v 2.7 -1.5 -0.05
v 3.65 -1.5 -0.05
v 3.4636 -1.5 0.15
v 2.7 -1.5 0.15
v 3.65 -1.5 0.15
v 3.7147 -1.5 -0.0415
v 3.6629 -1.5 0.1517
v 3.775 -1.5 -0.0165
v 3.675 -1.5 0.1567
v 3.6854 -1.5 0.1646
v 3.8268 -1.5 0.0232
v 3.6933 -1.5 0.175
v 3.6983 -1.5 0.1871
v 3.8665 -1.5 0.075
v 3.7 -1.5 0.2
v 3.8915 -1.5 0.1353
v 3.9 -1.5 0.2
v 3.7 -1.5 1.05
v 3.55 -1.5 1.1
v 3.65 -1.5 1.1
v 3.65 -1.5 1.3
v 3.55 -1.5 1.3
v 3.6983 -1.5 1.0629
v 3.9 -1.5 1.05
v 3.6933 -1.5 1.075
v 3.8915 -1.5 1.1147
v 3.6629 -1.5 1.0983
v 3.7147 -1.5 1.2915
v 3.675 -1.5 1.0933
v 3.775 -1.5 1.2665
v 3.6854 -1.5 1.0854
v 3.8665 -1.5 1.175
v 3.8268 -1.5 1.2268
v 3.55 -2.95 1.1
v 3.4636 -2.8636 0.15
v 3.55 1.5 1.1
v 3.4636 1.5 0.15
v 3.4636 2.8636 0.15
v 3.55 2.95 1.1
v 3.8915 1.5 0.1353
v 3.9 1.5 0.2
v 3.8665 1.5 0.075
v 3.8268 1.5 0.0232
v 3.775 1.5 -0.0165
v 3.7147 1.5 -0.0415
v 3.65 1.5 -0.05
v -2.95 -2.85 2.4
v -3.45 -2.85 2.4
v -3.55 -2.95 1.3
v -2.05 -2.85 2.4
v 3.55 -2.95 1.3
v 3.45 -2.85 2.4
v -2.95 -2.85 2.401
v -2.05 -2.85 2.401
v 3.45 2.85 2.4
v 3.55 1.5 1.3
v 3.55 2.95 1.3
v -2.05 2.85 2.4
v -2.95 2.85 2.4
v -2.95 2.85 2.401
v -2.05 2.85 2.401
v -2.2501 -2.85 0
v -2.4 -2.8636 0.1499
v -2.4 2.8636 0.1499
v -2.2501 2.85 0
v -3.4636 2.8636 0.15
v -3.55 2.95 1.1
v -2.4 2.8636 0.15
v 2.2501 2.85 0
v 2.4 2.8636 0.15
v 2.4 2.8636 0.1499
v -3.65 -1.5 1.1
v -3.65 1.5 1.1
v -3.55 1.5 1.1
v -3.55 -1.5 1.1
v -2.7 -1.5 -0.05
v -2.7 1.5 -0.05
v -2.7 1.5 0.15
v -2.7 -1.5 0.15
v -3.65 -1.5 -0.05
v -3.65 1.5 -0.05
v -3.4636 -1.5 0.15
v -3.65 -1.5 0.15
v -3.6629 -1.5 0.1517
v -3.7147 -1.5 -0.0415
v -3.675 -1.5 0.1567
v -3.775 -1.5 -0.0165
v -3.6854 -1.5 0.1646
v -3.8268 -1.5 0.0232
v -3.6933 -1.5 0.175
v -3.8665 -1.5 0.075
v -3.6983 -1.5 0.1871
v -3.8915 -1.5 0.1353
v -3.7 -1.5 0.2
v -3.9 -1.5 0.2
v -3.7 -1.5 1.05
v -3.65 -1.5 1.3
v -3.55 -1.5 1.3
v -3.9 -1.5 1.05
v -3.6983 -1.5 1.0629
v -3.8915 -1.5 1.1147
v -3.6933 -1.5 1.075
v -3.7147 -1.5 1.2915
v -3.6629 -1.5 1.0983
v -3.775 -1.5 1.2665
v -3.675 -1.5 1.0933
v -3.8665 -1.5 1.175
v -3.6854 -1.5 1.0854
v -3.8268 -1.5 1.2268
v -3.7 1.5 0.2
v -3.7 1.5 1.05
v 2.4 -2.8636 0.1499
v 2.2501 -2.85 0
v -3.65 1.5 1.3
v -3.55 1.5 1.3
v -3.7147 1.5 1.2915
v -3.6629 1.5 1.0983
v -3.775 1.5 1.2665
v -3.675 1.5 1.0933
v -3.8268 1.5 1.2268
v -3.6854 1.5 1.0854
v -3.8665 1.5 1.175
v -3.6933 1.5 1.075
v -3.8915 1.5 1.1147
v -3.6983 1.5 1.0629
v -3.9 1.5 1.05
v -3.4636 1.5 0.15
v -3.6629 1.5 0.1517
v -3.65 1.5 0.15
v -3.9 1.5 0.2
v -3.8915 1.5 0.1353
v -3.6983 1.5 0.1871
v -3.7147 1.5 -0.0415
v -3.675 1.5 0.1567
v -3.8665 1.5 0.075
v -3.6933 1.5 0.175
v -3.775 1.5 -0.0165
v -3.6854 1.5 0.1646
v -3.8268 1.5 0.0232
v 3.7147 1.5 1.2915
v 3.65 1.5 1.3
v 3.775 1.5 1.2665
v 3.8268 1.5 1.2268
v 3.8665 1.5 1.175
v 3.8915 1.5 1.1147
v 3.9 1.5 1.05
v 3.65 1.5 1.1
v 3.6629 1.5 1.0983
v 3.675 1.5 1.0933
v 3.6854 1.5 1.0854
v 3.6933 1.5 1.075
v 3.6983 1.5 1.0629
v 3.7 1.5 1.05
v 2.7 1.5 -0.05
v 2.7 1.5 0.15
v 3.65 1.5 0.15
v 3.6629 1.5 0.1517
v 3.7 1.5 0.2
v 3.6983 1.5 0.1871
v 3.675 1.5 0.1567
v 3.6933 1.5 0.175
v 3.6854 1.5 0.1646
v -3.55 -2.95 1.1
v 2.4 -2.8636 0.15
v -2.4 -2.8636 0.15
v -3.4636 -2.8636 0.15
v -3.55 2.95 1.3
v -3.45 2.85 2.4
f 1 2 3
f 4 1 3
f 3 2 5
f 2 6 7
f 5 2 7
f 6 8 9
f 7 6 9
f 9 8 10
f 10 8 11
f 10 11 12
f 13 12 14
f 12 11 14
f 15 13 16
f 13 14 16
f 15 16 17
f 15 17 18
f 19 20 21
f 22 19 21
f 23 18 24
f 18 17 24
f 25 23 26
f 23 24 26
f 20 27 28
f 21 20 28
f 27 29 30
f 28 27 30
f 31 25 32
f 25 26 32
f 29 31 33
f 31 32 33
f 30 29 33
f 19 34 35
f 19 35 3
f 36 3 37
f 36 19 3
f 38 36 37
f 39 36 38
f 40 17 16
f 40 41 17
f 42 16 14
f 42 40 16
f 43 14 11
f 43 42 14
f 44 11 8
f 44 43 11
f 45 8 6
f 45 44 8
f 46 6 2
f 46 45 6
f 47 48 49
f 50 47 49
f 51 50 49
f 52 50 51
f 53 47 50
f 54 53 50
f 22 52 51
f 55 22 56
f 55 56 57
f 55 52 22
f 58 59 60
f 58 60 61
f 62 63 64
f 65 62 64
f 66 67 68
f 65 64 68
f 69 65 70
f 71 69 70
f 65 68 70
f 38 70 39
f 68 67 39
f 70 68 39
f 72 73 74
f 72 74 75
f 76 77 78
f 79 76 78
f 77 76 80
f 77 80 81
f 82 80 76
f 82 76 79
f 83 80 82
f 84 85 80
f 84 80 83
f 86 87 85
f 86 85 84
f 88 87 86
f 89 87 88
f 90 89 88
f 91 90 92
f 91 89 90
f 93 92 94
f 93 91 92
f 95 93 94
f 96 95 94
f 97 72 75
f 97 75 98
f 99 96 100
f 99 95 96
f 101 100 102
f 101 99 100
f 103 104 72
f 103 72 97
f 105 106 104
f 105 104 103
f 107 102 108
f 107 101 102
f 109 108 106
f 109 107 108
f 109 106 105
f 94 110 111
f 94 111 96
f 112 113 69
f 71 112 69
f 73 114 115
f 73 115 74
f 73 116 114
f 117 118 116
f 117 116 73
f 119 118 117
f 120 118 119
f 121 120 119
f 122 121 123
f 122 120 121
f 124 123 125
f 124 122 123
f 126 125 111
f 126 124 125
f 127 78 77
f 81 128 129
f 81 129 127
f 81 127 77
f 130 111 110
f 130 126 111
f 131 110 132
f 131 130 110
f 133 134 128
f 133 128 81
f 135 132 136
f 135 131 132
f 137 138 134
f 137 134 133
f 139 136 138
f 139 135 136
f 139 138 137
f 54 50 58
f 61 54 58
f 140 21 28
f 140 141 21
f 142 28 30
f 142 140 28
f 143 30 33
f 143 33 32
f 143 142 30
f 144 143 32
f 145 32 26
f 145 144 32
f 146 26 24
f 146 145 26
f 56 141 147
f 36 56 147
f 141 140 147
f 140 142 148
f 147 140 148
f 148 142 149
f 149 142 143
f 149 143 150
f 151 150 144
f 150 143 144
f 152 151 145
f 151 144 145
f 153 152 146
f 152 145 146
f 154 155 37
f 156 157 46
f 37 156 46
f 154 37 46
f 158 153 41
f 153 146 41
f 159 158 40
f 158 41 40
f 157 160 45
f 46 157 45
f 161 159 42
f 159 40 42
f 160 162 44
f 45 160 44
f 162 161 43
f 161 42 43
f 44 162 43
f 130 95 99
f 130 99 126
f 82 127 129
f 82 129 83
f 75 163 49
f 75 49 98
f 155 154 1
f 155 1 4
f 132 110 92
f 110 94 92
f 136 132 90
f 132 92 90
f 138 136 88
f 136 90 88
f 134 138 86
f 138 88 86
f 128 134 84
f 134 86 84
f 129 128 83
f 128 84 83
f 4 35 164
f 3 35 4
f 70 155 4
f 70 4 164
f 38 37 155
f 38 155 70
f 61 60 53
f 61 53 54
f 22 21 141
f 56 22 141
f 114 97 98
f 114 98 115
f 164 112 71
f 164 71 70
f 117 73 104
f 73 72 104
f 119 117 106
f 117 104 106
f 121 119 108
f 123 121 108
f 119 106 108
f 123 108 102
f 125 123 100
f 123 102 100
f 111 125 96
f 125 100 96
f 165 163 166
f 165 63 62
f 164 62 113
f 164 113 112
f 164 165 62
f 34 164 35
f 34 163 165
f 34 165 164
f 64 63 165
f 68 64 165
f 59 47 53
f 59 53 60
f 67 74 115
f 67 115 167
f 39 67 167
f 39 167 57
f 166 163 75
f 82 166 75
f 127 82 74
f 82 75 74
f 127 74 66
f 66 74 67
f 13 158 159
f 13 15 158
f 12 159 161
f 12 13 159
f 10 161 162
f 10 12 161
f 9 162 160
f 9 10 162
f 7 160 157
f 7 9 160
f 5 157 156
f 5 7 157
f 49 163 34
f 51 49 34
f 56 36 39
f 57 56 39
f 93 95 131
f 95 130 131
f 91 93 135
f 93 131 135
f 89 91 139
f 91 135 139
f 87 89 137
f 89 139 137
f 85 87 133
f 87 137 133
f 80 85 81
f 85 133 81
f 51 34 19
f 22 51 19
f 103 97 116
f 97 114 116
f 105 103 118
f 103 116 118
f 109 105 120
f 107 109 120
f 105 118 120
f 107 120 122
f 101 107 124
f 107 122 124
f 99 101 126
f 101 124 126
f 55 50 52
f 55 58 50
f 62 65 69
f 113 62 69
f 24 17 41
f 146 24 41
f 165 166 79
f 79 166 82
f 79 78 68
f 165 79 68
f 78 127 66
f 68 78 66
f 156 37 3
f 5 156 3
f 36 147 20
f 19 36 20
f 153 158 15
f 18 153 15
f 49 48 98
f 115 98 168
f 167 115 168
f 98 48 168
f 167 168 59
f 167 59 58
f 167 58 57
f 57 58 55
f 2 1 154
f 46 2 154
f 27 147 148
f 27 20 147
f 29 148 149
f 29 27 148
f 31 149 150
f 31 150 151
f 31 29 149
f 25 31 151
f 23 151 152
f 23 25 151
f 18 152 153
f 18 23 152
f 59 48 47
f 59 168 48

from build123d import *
from OCP.BRepFilletAPI import BRepFilletAPI_MakeChamfer

# Parameters (mm, degrees)
SZKIC1_W                    = 7.1
SZKIC1_H                    = 5.9
DODANIE_WYCI_GNI_CIE1_DEPTH = 2.4
SFAZOWANIE1_SIZE            = 1.1
SFAZOWANIE1_SIZE2           = 0.1
SFAZOWANIE2_SIZE            = 0.1
SFAZOWANIE2_SIZE2           = 1.1
SZKIC2_W                    = 0.9
SZKIC2_H                    = 5.7
DODANIE_WYCI_GNI_CIE2_DEPTH = 0.001
SZKIC3_W                    = 0.15
SZKIC3_H                    = 5.9
WYTNIJ_WYCI_GNI_CIE1_DEPTH  = 1.15
SFAZOWANIE3_SIZE            = 0.15
SZKIC4_W                    = 0.2
SZKIC4_H                    = 3
SFAZOWANIE3_OF_LUSTRO1_SIZE = 0.15


with BuildPart() as part:
    # Szkic1 → Dodanie-wyciągnięcie1 (new body)
    with BuildSketch(Plane.XY):
        Rectangle(SZKIC1_W, SZKIC1_H)
    extrude(amount=DODANIE_WYCI_GNI_CIE1_DEPTH)

    # Sfazowanie1: one chamfer whose edges measure the first distance from different faces: ONE call of the kernel's chamfer builder (chamfer() names one face for all edges)
    sfazowanie1_edges_1 = [part.edges().sort_by_distance(p)[0] for p in [
        (3.55, 0, 2.4),
    ]]
    sfazowanie1_side_1 = [part.faces().sort_by_distance(p)[0] for p in [
        (3.55, 0, 1.2),
    ]]
    sfazowanie1_edges_2 = [part.edges().sort_by_distance(p)[0] for p in [
        (0, 2.95, 2.4),
    ]]
    sfazowanie1_side_2 = [part.faces().sort_by_distance(p)[0] for p in [
        (0, 2.95, 1.2),
    ]]
    sfazowanie1_edges_3 = [part.edges().sort_by_distance(p)[0] for p in [
        (-3.55, 0, 2.4),
    ]]
    sfazowanie1_side_3 = [part.faces().sort_by_distance(p)[0] for p in [
        (-3.55, 0, 1.2),
    ]]
    sfazowanie1_edges_4 = [part.edges().sort_by_distance(p)[0] for p in [
        (0, -2.95, 2.4),
    ]]
    sfazowanie1_side_4 = [part.faces().sort_by_distance(p)[0] for p in [
        (0, -2.95, 1.2),
    ]]
    sfazowanie1 = BRepFilletAPI_MakeChamfer(part.part.solid().wrapped)
    for e in sfazowanie1_edges_1:
        sfazowanie1.Add(SFAZOWANIE1_SIZE, SFAZOWANIE1_SIZE2, e.wrapped, sfazowanie1_side_1[0].wrapped)  # the first distance lies on this face
    for e in sfazowanie1_edges_2:
        sfazowanie1.Add(SFAZOWANIE1_SIZE, SFAZOWANIE1_SIZE2, e.wrapped, sfazowanie1_side_2[0].wrapped)  # the first distance lies on this face
    for e in sfazowanie1_edges_3:
        sfazowanie1.Add(SFAZOWANIE1_SIZE, SFAZOWANIE1_SIZE2, e.wrapped, sfazowanie1_side_3[0].wrapped)  # the first distance lies on this face
    for e in sfazowanie1_edges_4:
        sfazowanie1.Add(SFAZOWANIE1_SIZE, SFAZOWANIE1_SIZE2, e.wrapped, sfazowanie1_side_4[0].wrapped)  # the first distance lies on this face
    add(Compound.cast(sfazowanie1.Shape()), mode=Mode.REPLACE)

    # Sfazowanie2
    sfazowanie2_edges = [part.edges().sort_by_distance(p)[0] for p in [
        (0, 2.95, 0),
        (3.55, 0, 0),
        (0, -2.95, 0),
        (-3.55, 0, 0),
    ]]
    sfazowanie2_side = [part.faces().sort_by_distance(p)[0] for p in [
        (0, 0, 0),
    ]]
    chamfer(sfazowanie2_edges, length=SFAZOWANIE2_SIZE, length2=SFAZOWANIE2_SIZE2, reference=sfazowanie2_side[0])

    # Szkic2 → Dodanie-wyciągnięcie2 (add)
    with BuildSketch(Plane.XY.offset(2.4)):
        with Locations((-2.5, 0)):
            Rectangle(SZKIC2_W, SZKIC2_H)
    extrude(amount=DODANIE_WYCI_GNI_CIE2_DEPTH)

    # Szkic3 → Wytnij-wyciągnięcie1 (cut)
    with BuildSketch(Plane.ZY.offset(3.55)):
        with Locations((0.075, 0)):
            Rectangle(SZKIC3_W, SZKIC3_H)
    wytnij_wyci_gni_cie1 = extrude(amount=-WYTNIJ_WYCI_GNI_CIE1_DEPTH, mode=Mode.SUBTRACT)

    # Sfazowanie3
    sfazowanie3_edges = [part.edges().sort_by_distance(p)[0] for p in [
        (-2.4, 0, 0),
    ]]
    chamfer(sfazowanie3_edges, length=SFAZOWANIE3_SIZE - 0.0001)  # a hair under: the kernel refuses the full size

    # Wyciągnięcie po ścieżce1: sweep along a path in Szkic5
    with BuildLine(Plane(origin=(0, 0, 0), x_dir=(1, 0, 0), z_dir=(0, 1, 0))) as wyci_gni_cie_po_cie_ce1_path:
        Line((-3.55, -1.3), (-3.65, -1.3))
        ThreePointArc((-3.65, -1.3), (-3.826776695, -1.226776695), (-3.9, -1.05))
        Line((-3.9, -1.05), (-3.9, -0.2))
        ThreePointArc((-3.9, -0.2), (-3.826776695, -0.023223305), (-3.65, 0.05))
        Line((-3.65, 0.05), (-2.7, 0.05))
    # Szkic4 → Wyciągnięcie po ścieżce1 (sweep)
    with BuildSketch(Plane.ZY.offset(3.55)):
        with Locations((1.2, 0)):
            Rectangle(SZKIC4_W, SZKIC4_H)
    wyci_gni_cie_po_cie_ce1 = sweep(path=wyci_gni_cie_po_cie_ce1_path.line)

    # Lustro1: Wytnij-wyciągnięcie1, Wyciągnięcie po ścieżce1 across plane
    add(wytnij_wyci_gni_cie1.mirror(Plane(origin=(0, 0, 0), x_dir=(0, 0, 1), z_dir=(1, 0, 0))), mode=Mode.SUBTRACT)
    add(wyci_gni_cie_po_cie_ce1.mirror(Plane(origin=(0, 0, 0), x_dir=(0, 0, 1), z_dir=(1, 0, 0))))

    # Sfazowanie3 of Lustro1
    sfazowanie3_of_lustro1_edges = [part.edges().sort_by_distance(p)[0] for p in [
        (2.4, 0, 0),
    ]]
    chamfer(sfazowanie3_of_lustro1_edges, length=SFAZOWANIE3_OF_LUSTRO1_SIZE - 0.0001)  # a hair under: the kernel refuses the full size


solid = part.part
